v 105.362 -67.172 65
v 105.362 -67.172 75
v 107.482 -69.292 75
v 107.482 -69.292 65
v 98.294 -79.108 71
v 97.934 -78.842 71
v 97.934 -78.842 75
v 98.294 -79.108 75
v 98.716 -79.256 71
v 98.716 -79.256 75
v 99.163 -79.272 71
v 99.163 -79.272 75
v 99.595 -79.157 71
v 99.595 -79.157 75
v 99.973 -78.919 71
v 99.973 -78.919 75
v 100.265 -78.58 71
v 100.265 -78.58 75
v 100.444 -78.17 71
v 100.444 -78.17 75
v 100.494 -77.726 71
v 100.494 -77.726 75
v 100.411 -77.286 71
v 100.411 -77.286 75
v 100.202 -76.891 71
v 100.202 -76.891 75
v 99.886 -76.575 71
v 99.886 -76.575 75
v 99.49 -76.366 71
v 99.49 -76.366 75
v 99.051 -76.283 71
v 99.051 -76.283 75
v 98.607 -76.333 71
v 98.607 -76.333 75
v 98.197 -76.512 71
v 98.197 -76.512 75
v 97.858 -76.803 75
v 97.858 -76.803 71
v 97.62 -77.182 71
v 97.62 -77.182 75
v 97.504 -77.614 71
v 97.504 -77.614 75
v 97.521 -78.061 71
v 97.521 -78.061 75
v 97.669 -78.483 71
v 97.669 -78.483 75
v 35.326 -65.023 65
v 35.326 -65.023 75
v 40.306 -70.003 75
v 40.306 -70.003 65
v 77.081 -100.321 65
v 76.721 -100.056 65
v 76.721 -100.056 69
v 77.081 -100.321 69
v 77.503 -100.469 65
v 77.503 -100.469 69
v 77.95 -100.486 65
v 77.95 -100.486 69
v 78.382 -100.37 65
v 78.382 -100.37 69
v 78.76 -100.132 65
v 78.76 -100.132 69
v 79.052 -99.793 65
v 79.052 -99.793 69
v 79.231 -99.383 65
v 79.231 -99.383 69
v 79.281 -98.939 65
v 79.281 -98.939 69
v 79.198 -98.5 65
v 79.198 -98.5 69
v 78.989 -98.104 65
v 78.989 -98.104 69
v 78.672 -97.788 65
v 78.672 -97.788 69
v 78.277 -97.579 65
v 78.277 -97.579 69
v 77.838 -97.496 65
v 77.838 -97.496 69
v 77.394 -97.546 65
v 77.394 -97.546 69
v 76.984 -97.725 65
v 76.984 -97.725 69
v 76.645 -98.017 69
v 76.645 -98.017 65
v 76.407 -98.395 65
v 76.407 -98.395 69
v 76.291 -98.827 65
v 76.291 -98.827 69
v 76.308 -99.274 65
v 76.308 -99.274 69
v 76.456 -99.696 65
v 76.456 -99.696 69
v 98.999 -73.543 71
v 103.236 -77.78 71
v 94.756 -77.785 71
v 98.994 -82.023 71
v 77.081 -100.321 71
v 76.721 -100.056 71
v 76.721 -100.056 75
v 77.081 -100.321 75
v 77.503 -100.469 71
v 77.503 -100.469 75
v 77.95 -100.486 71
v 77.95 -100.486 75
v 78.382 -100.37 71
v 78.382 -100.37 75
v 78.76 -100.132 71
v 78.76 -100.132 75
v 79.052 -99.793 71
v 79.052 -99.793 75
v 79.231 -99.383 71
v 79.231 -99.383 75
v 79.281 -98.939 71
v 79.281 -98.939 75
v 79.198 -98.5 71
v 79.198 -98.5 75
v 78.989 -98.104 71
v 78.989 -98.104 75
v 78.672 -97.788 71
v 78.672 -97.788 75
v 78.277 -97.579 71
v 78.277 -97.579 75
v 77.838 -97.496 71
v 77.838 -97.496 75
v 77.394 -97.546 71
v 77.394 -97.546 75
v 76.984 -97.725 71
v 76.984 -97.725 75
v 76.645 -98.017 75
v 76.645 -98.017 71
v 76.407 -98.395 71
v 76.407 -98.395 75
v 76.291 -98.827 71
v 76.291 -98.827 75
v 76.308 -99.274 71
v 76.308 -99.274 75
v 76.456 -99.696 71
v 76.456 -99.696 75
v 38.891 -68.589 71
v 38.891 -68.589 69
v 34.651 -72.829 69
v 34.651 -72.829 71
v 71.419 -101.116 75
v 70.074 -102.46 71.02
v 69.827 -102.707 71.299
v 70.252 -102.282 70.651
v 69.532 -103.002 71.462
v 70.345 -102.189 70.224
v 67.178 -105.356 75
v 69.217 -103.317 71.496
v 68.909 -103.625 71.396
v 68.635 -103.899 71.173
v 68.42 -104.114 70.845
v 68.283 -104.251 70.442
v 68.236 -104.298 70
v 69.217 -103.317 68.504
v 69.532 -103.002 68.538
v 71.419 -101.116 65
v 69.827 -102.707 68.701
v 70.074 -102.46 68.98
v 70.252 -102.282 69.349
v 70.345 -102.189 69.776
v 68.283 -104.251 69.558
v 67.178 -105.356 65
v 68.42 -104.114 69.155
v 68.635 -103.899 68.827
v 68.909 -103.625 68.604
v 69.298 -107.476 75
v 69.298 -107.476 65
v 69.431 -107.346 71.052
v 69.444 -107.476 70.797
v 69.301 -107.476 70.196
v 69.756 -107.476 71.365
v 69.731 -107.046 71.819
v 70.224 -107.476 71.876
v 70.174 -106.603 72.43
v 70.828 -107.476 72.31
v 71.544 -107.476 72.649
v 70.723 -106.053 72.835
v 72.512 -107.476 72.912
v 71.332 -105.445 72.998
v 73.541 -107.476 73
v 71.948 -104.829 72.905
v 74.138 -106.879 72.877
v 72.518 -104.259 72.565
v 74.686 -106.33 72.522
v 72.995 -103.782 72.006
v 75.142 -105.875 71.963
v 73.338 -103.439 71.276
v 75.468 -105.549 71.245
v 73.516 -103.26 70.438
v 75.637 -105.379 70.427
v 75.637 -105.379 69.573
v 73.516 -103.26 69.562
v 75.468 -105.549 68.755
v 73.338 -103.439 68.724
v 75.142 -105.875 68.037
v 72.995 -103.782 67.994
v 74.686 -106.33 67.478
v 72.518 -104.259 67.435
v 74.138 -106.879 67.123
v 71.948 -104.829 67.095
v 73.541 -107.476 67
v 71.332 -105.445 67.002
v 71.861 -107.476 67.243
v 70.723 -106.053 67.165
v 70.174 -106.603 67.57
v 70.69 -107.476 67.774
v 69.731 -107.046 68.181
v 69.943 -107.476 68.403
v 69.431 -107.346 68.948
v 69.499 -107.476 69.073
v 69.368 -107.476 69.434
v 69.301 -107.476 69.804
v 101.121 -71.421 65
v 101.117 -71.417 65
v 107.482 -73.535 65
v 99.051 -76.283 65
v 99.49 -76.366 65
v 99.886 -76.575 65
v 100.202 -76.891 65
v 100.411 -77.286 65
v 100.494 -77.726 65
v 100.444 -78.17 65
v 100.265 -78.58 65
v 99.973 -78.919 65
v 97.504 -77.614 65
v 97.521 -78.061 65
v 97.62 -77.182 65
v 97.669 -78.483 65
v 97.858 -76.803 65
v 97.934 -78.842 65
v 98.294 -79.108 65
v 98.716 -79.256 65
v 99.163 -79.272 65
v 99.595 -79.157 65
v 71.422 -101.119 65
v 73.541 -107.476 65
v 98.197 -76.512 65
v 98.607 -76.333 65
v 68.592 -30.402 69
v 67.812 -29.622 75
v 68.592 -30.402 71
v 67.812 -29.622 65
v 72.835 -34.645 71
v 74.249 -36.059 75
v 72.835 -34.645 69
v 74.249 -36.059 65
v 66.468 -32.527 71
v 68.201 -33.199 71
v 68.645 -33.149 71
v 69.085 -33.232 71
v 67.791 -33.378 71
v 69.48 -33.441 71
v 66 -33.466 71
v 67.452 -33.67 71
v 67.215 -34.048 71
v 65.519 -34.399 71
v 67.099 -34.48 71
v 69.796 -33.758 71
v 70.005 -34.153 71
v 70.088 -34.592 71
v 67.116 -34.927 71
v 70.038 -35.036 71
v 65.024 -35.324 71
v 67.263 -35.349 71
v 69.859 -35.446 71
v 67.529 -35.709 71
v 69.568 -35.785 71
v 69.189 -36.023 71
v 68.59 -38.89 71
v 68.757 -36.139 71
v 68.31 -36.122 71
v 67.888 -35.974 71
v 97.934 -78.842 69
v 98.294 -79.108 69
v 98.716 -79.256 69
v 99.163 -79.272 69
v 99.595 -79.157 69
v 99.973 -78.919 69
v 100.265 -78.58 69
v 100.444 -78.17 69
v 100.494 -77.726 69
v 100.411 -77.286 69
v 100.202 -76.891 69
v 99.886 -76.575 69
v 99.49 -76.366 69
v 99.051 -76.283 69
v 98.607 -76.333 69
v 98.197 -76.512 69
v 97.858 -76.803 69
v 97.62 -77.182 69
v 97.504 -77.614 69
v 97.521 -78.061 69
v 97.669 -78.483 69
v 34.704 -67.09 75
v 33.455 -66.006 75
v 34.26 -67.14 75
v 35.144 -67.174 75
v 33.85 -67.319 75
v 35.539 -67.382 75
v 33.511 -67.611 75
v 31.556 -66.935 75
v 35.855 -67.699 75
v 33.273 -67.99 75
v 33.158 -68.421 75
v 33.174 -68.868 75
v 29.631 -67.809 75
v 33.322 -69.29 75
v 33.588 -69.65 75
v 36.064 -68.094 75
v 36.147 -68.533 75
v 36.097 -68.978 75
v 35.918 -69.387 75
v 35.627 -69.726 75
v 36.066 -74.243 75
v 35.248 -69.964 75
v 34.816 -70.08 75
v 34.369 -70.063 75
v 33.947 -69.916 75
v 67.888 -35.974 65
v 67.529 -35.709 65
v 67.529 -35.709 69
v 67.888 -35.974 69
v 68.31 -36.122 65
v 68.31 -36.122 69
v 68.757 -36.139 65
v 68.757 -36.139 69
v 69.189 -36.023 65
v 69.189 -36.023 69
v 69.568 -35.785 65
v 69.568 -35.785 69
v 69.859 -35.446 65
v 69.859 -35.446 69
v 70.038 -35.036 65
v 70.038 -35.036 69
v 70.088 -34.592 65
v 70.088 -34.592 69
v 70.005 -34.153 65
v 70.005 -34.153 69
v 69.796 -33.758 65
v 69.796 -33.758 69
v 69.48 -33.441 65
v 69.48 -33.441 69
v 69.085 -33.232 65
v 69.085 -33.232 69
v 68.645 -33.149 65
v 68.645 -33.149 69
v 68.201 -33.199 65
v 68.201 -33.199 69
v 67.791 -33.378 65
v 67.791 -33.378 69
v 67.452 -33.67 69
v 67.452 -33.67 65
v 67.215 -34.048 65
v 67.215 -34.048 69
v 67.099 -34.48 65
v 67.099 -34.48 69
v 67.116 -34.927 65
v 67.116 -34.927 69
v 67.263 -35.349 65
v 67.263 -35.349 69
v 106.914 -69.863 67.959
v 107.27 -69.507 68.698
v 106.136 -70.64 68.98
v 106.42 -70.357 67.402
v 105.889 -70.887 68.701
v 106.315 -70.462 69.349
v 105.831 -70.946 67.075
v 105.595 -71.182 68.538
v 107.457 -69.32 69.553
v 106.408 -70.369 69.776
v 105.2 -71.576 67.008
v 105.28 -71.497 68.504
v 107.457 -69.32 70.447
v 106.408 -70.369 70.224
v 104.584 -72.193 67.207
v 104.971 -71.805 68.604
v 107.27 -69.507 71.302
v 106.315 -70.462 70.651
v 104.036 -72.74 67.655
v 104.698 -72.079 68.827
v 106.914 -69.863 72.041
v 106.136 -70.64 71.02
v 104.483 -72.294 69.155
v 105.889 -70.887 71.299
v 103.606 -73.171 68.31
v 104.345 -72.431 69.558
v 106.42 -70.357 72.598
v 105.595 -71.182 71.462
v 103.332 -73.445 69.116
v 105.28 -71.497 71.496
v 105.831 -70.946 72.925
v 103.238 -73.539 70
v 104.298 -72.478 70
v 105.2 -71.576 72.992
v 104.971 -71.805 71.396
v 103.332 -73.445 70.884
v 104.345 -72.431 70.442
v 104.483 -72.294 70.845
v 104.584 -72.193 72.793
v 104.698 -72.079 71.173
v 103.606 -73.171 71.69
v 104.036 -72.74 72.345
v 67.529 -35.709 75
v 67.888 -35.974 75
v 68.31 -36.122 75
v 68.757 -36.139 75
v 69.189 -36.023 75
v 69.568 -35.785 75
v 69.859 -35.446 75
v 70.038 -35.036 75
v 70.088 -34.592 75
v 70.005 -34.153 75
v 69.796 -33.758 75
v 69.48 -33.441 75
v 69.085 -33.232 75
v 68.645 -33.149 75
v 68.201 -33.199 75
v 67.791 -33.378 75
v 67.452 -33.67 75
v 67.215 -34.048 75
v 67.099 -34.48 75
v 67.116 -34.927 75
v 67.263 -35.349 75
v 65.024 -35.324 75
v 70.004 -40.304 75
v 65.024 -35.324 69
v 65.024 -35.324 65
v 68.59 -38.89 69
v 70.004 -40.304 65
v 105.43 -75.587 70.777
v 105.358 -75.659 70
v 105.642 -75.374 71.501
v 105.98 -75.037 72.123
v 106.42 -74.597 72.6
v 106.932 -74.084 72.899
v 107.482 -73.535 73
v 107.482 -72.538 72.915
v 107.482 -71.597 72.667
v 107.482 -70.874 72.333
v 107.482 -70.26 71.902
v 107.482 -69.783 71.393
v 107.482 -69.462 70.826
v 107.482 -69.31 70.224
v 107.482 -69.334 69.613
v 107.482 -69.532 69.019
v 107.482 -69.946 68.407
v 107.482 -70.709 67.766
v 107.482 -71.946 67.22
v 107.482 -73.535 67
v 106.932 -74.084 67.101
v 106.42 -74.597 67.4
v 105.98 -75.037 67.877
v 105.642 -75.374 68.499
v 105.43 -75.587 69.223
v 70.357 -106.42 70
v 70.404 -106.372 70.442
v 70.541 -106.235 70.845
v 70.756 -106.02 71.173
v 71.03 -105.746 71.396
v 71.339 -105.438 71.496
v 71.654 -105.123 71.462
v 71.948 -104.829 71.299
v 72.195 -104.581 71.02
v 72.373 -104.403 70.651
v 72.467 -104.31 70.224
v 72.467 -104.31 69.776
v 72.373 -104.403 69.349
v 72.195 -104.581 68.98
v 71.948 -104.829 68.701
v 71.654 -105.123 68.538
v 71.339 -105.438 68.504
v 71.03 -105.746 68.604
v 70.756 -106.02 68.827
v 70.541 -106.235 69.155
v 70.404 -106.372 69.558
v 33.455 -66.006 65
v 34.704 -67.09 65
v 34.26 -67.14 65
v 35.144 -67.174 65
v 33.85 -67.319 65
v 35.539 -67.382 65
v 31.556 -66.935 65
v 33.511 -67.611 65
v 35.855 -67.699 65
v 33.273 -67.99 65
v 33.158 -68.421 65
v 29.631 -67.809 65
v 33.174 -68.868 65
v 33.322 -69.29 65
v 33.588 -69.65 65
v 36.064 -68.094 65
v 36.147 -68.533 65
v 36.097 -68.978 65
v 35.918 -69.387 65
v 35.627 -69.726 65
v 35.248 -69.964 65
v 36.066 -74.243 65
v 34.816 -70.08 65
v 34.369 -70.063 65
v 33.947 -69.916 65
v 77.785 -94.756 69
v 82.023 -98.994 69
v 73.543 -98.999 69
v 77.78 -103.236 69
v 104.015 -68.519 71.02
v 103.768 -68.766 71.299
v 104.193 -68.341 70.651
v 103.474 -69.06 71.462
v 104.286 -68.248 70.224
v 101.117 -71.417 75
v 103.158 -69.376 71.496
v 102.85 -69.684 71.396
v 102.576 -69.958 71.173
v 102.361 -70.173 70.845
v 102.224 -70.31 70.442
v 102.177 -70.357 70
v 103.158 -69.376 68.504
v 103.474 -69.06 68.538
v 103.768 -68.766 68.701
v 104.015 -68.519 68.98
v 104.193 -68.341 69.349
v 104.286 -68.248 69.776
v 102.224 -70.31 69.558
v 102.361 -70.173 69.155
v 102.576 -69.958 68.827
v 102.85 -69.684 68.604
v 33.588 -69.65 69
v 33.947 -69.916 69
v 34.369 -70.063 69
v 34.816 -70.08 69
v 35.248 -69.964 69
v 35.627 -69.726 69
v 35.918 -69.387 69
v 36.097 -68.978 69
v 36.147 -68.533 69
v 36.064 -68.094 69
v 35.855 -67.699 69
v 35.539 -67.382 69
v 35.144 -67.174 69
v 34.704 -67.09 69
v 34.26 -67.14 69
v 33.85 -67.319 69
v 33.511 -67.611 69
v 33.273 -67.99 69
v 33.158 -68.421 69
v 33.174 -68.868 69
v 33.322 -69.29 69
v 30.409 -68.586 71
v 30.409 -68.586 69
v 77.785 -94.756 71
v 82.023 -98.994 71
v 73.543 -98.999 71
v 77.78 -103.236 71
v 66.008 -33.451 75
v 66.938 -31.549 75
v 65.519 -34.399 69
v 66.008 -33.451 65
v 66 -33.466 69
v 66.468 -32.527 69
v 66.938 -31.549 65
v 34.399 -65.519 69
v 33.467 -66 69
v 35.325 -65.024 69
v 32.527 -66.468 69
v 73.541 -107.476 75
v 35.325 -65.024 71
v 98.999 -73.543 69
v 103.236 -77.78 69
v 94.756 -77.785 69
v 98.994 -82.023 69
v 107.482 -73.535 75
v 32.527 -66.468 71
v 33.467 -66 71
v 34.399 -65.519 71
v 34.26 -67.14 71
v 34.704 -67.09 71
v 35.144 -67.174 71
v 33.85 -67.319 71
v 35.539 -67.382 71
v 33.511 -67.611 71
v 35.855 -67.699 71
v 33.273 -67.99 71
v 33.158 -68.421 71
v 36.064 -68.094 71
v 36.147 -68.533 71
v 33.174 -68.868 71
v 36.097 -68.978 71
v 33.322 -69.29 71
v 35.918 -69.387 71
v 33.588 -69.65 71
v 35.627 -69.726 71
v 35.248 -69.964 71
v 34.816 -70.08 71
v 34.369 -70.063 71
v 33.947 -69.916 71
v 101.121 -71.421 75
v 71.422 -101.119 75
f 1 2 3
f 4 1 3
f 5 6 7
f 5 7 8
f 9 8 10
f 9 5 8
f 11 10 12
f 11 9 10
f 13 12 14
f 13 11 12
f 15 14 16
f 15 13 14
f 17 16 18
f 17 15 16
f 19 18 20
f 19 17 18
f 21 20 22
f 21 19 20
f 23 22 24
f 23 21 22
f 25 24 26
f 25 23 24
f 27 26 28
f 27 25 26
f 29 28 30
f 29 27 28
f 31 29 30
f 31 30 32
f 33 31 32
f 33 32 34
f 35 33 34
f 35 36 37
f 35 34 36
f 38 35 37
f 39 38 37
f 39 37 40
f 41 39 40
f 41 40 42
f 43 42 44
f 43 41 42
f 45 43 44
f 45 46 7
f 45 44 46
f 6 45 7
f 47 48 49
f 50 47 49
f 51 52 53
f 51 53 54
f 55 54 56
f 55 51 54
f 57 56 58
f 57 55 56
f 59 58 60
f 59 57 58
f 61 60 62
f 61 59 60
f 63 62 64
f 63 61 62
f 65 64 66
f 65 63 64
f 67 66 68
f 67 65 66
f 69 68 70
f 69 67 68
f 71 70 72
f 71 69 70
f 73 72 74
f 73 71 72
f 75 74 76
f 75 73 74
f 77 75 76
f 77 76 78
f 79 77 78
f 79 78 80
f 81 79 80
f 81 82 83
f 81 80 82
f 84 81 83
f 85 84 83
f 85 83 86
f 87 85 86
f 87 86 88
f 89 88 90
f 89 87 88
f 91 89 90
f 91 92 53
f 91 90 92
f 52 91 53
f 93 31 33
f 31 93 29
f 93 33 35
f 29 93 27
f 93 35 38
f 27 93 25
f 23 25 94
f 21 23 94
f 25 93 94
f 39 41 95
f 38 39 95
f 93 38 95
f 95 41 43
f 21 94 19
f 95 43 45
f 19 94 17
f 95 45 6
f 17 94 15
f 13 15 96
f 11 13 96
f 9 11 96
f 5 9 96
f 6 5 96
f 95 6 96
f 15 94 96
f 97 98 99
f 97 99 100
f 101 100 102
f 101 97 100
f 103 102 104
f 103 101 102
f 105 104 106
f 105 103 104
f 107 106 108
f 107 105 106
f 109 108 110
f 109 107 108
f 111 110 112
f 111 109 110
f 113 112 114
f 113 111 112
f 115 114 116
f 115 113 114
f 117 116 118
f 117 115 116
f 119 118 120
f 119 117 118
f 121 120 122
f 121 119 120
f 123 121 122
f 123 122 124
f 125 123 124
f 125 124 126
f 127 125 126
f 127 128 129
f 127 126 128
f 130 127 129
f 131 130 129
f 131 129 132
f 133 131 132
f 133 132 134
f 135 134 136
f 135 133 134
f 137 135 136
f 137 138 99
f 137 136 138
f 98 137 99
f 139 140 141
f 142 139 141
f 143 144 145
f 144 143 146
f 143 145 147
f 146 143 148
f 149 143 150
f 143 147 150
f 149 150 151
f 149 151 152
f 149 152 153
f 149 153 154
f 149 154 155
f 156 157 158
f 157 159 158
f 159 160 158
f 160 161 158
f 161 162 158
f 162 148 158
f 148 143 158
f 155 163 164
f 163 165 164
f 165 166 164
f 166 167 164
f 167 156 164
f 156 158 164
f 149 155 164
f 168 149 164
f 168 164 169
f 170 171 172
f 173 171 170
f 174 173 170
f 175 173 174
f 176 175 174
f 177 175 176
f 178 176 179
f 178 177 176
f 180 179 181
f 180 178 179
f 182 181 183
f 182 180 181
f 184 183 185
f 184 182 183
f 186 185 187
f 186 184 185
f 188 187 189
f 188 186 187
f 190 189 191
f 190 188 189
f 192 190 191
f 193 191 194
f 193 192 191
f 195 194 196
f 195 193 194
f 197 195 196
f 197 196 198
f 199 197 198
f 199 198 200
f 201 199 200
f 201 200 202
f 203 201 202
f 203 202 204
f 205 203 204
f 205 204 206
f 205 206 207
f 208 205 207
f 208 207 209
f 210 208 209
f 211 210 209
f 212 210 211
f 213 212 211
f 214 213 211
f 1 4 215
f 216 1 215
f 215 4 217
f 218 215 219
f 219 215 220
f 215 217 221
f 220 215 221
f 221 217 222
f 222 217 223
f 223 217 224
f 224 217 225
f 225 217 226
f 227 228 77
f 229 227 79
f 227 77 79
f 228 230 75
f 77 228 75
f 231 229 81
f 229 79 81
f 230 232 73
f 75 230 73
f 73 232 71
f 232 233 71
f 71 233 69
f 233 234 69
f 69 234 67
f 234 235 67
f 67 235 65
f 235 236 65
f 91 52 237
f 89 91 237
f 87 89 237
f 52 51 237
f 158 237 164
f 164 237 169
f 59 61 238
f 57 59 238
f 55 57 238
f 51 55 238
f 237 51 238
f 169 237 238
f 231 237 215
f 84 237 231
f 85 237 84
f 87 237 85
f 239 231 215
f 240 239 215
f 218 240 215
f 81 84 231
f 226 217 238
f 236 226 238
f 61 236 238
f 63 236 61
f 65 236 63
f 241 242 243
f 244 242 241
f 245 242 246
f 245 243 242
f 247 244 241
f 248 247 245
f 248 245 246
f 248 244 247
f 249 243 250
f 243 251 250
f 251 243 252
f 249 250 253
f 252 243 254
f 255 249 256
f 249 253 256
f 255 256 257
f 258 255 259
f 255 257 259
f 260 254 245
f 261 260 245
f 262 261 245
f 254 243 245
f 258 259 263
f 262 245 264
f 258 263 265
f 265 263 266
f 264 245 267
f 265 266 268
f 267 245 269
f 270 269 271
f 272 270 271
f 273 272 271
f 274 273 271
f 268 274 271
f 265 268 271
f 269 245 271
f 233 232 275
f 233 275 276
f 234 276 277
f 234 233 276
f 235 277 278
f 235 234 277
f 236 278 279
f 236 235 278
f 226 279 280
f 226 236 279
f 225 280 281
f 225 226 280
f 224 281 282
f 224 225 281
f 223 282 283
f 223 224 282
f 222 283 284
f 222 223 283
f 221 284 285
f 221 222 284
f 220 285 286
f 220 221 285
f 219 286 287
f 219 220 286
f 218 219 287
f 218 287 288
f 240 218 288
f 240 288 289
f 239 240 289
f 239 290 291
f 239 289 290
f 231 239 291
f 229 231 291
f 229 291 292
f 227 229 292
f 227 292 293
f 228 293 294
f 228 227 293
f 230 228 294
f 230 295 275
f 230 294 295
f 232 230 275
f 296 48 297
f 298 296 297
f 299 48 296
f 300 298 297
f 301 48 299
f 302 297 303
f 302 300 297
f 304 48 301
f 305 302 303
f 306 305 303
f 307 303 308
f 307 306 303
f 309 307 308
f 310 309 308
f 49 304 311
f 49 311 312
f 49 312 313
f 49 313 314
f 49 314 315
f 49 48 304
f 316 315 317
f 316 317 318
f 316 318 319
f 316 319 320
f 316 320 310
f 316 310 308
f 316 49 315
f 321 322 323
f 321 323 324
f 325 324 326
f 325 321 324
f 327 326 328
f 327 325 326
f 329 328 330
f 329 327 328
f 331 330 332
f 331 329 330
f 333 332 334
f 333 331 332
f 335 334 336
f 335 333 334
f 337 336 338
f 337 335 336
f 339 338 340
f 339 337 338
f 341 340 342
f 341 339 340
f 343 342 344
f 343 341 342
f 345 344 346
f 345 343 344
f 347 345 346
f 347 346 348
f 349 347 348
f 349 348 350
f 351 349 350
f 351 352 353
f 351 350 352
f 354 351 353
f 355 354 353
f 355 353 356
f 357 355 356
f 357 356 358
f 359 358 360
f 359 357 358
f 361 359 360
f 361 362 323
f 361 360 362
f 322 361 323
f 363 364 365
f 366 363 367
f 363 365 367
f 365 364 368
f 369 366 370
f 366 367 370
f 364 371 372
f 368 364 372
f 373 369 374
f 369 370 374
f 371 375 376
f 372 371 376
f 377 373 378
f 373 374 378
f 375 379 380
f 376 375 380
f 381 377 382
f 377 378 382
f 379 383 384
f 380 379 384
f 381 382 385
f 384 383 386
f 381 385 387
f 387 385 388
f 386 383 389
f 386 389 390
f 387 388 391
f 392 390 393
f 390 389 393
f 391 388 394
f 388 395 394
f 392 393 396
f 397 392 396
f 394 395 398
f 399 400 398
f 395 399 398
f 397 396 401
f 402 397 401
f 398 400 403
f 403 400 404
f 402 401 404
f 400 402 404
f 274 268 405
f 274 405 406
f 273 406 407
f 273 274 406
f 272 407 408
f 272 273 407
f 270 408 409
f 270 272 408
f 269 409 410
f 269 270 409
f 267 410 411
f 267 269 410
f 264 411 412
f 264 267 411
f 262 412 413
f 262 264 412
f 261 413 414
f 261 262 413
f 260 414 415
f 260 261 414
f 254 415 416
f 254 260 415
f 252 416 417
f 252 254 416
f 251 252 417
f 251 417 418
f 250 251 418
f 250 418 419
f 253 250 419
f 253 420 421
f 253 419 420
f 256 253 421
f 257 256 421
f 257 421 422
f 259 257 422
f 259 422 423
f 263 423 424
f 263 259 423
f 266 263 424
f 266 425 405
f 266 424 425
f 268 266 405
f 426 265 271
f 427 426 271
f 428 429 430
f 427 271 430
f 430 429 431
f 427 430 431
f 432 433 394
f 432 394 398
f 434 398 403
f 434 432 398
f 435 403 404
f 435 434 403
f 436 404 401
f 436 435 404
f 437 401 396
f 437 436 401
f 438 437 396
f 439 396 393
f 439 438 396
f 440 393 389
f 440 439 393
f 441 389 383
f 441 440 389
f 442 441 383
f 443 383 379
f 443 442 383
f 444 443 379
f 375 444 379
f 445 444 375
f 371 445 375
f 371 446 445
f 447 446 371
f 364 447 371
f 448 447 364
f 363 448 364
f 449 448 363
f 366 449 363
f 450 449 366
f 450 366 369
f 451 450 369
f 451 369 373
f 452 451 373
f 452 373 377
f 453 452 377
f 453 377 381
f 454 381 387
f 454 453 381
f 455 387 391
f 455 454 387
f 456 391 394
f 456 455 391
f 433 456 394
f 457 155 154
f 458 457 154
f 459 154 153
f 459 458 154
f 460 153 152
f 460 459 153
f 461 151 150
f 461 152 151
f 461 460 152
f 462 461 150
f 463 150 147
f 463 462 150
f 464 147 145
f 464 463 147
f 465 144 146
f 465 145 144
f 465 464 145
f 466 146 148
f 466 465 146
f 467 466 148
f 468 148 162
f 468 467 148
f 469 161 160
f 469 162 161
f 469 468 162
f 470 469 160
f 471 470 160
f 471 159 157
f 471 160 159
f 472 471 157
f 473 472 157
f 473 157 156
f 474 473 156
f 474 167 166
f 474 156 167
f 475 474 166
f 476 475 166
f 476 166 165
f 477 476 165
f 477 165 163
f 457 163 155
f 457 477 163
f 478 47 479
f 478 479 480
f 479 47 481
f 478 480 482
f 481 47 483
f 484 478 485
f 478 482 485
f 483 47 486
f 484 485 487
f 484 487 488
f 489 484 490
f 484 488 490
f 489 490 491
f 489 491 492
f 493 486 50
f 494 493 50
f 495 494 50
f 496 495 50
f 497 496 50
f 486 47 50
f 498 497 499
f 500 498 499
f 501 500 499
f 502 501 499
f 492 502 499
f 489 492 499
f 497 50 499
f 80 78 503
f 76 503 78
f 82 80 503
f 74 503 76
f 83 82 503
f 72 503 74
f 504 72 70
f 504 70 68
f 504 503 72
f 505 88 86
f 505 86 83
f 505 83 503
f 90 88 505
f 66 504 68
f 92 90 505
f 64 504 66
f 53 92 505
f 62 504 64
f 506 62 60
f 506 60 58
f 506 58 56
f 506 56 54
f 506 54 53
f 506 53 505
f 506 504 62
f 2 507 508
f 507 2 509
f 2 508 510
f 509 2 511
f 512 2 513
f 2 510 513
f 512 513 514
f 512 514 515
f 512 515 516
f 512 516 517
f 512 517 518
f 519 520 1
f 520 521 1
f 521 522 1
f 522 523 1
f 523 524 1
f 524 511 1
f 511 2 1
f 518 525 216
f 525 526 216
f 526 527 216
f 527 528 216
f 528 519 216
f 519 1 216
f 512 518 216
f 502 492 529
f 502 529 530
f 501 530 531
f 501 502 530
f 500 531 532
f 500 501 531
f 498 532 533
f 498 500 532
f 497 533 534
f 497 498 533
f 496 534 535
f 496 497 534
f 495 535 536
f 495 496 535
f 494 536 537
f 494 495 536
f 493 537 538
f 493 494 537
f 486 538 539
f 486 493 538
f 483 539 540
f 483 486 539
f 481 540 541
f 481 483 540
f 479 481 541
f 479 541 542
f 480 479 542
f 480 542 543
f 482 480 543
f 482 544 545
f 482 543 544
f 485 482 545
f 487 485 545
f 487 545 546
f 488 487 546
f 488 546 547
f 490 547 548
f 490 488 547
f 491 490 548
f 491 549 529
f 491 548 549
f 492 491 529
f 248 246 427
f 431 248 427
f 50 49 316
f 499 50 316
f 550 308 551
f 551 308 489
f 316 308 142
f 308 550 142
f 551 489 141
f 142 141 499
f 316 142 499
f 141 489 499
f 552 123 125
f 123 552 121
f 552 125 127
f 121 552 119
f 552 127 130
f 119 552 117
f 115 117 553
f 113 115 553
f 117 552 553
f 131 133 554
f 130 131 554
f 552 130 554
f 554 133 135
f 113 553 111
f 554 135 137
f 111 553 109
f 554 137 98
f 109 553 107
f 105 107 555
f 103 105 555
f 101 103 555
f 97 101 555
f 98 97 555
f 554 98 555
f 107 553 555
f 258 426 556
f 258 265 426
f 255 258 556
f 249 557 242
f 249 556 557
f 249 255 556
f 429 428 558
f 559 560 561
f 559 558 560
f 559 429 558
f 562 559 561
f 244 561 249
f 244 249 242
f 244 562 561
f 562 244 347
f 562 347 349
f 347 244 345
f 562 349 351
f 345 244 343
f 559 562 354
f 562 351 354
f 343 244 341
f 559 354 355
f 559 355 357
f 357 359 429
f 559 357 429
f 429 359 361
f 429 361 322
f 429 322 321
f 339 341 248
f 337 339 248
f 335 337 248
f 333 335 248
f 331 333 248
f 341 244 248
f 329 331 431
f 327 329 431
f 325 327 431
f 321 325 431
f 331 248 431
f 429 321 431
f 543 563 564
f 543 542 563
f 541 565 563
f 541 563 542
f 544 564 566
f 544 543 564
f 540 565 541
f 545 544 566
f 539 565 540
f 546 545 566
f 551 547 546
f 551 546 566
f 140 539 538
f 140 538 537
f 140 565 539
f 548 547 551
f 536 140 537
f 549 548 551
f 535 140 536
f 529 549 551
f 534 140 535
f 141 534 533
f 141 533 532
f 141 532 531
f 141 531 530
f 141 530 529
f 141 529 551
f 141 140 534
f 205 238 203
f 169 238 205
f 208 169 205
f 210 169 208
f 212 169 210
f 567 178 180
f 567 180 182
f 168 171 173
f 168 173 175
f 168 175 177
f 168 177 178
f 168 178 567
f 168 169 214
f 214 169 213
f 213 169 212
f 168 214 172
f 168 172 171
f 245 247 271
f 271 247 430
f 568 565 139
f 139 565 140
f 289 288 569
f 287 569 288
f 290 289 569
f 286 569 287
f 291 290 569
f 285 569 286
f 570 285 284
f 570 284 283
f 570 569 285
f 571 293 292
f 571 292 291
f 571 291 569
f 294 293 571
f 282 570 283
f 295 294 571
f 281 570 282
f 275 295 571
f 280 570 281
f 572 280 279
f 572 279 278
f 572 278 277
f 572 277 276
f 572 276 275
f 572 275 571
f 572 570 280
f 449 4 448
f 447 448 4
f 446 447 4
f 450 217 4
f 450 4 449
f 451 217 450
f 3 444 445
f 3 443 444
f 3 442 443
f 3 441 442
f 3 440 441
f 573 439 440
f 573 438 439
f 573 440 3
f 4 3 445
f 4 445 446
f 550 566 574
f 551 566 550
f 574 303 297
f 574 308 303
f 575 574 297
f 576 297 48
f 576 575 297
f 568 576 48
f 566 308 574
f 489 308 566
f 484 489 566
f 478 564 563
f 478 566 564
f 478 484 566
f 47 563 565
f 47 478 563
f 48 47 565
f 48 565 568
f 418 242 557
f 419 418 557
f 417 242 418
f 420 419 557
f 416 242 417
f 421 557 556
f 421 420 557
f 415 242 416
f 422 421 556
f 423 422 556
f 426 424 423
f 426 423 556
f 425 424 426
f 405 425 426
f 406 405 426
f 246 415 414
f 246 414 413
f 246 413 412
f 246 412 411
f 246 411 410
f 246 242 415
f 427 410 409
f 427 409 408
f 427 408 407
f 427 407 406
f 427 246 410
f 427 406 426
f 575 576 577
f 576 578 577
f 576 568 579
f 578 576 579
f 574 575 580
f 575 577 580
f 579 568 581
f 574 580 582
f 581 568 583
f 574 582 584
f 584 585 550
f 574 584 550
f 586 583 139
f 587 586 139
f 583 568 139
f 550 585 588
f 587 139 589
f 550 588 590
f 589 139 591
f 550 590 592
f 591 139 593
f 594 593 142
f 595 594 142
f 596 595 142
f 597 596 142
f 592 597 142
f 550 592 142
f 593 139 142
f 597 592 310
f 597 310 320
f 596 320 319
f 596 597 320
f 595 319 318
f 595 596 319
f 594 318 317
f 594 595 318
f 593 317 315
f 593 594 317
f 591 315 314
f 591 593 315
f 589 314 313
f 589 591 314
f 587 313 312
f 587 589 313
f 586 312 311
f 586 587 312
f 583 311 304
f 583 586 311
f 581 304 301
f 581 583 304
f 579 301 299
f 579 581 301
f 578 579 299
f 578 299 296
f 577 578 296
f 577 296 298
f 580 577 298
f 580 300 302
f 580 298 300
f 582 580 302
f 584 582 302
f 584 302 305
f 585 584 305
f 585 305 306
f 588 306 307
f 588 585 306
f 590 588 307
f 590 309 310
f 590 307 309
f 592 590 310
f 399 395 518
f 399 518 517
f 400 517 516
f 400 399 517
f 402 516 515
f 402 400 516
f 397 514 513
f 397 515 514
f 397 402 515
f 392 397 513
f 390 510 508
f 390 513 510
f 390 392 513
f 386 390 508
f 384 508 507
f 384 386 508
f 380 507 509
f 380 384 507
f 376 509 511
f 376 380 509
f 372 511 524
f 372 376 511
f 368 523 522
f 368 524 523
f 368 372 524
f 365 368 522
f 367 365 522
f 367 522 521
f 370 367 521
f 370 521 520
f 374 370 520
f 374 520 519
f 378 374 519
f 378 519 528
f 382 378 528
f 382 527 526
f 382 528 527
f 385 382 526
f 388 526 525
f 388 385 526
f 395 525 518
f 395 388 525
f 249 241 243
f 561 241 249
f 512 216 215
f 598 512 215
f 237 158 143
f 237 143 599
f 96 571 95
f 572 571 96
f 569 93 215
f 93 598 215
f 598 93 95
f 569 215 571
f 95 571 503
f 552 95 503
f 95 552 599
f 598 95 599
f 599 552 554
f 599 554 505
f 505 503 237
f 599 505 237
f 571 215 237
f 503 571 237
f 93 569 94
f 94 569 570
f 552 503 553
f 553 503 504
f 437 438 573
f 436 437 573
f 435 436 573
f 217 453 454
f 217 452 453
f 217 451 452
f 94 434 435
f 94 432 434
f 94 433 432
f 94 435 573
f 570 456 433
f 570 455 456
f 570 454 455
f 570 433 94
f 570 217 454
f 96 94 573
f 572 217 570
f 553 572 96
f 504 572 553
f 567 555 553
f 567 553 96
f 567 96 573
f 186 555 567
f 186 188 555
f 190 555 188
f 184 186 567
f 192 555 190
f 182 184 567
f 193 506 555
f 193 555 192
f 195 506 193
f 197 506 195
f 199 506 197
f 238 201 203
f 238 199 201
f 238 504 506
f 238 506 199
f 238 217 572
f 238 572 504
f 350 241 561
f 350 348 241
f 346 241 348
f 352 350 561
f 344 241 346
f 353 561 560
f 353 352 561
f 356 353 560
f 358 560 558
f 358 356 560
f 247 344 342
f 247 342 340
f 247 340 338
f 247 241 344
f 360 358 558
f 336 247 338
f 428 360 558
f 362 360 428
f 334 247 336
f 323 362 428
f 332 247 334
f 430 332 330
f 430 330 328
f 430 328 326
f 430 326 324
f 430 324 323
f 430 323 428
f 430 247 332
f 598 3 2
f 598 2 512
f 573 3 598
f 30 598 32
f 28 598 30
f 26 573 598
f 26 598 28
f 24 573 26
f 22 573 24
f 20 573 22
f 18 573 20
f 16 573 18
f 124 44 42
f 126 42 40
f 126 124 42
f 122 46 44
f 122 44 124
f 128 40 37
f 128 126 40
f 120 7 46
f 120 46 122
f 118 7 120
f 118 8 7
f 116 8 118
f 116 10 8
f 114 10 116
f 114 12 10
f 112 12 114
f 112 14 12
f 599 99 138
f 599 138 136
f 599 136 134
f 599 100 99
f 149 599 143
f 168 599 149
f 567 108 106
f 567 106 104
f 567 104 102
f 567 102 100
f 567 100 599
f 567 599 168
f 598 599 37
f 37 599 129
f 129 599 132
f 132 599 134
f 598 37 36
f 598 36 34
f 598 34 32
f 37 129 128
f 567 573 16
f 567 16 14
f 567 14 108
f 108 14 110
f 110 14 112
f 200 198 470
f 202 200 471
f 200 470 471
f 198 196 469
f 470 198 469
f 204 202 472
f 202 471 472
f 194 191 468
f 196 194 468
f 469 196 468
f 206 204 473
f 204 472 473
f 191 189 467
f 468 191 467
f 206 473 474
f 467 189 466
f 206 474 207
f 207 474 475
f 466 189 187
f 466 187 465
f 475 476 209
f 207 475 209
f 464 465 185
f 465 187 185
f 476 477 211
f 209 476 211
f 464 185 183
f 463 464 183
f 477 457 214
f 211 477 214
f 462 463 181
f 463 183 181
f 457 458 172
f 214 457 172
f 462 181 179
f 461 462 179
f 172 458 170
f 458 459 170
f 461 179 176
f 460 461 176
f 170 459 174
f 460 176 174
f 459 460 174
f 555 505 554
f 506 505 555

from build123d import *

# Parameters (mm, degrees)
CYLINDER1721_R              = 1.5
CYLINDER1721_DEPTH          = 60
CYLINDER1718_R              = 1.5
CYLINDER1718_DEPTH          = 60
CYLINDER1719_R              = 1.5
CYLINDER1719_DEPTH          = 60
CYLINDER1720_R              = 1.5
CYLINDER1720_DEPTH          = 60
COMPOUND860_PLACEMENT_ANGLE = 225
BOX682_W                    = 6
BOX682_H                    = 6
BOX682_DEPTH                = 2
BOX680_W                    = 6
BOX680_H                    = 6
BOX680_DEPTH                = 2
BOX683_W                    = 6
BOX683_H                    = 6
BOX683_DEPTH                = 2
BOX681_W                    = 7
BOX681_H                    = 6
BOX681_DEPTH                = 2
COMPOUND859_PLACEMENT_ANGLE = 225
CYLINDER1711_R              = 1.5
CYLINDER1711_DEPTH          = 50
COMPOUND852_PLACEMENT_ANGLE = 225
CYLINDER1710_R              = 1.5
CYLINDER1710_DEPTH          = 50
COMPOUND851_PLACEMENT_ANGLE = 225
CYLINDER1713_R              = 3
CYLINDER1713_DEPTH          = 3
COMPOUND855_PLACEMENT_ANGLE = 225
CYLINDER1712_R              = 3
CYLINDER1712_DEPTH          = 3
COMPOUND854_PLACEMENT_ANGLE = 225
CYLINDER1709_R              = 74
CYLINDER1709_DEPTH          = 40
BOX675_W                    = 42
BOX675_H                    = 62
BOX675_DEPTH                = 50
COMPOUND850_PLACEMENT_ANGLE = 225
BOX674_W                    = 56
BOX674_H                    = 44
BOX674_DEPTH                = 10
COMPOUND849_PLACEMENT_ANGLE = 225
BOX673_W                    = 54
BOX673_H                    = 68
BOX673_DEPTH                = 10
COMPOUND848_PLACEMENT_ANGLE = 225
CHAMFER052_SIZE             = 3


with BuildPart() as v_lec1721:
    # Cylinder1721 → Cylinder1721 (new body)
    with BuildSketch(Plane(origin=(-24, 73, -80), x_dir=(1, 0, 0), z_dir=(0, 0, 1))):
        Circle(CYLINDER1721_R)
    extrude(amount=CYLINDER1721_DEPTH)


with BuildPart() as v_lec1718:
    # Cylinder1718 → Cylinder1718 (new body)
    with BuildSketch(Plane(origin=(-15, 125, -80), x_dir=(1, 0, 0), z_dir=(0, 0, 1))):
        Circle(CYLINDER1718_R)
    extrude(amount=CYLINDER1718_DEPTH)


with BuildPart() as v_lec1719:
    # Cylinder1719 → Cylinder1719 (new body)
    with BuildSketch(Plane(origin=(15, 125, -80), x_dir=(1, 0, 0), z_dir=(0, 0, 1))):
        Circle(CYLINDER1719_R)
    extrude(amount=CYLINDER1719_DEPTH)


with BuildPart() as compound860:
    # Cylinder1720 → Cylinder1720 (new body)
    with BuildSketch(Plane(origin=(24, 73, -80), x_dir=(1, 0, 0), z_dir=(0, 0, 1))):
        Circle(CYLINDER1720_R)
    extrude(amount=CYLINDER1720_DEPTH)

    # Compound860: union Válec1721, Válec1718, Válec1719
    add(v_lec1721.part)
    add(v_lec1718.part)
    add(v_lec1719.part)


with BuildPart() as compound860_1:
    # Compound860 placement: moved
    add(compound860.part.moved(Location((0, 0, 100))).rotate(Axis((0, 0, 100), (0, 0, 1)), COMPOUND860_PLACEMENT_ANGLE))


with BuildPart() as krychle682:
    # Box682 → Box682 (new body)
    with BuildSketch(Plane(origin=(-18, 122, -48), x_dir=(1, 0, 0), z_dir=(0, 0, 1))):
        with Locations((3, 3)):
            Rectangle(BOX682_W, BOX682_H)
    extrude(amount=BOX682_DEPTH)


with BuildPart() as krychle680:
    # Box680 → Box680 (new body)
    with BuildSketch(Plane(origin=(21, 70, -48), x_dir=(1, 0, 0), z_dir=(0, 0, 1))):
        with Locations((3, 3)):
            Rectangle(BOX680_W, BOX680_H)
    extrude(amount=BOX680_DEPTH)


with BuildPart() as krychle683:
    # Box683 → Box683 (new body)
    with BuildSketch(Plane(origin=(12, 122, -48), x_dir=(1, 0, 0), z_dir=(0, 0, 1))):
        with Locations((3, 3)):
            Rectangle(BOX683_W, BOX683_H)
    extrude(amount=BOX683_DEPTH)


with BuildPart() as compound859:
    # Box681 → Box681 (new body)
    with BuildSketch(Plane(origin=(-28, 70, -48), x_dir=(1, 0, 0), z_dir=(0, 0, 1))):
        with Locations((3.5, 3)):
            Rectangle(BOX681_W, BOX681_H)
    extrude(amount=BOX681_DEPTH)

    # Compound859: union Krychle682, Krychle680, Krychle683
    add(krychle682.part)
    add(krychle680.part)
    add(krychle683.part)


with BuildPart() as compound859_1:
    # Compound859 placement: moved
    add(compound859.part.moved(Location((0, 0, 117))).rotate(Axis((0, 0, 117), (0, 0, 1)), COMPOUND859_PLACEMENT_ANGLE))


with BuildPart() as compound852:
    # Cylinder1711 → Cylinder1711 (new body)
    with BuildSketch(Plane(origin=(24, 140, 72), x_dir=(1, 0, 0), z_dir=(0, -1, 0))):
        Circle(CYLINDER1711_R)
    extrude(amount=CYLINDER1711_DEPTH)


with BuildPart() as compound852_1:
    # Compound852 placement: moved
    add(compound852.part.rotate(Axis((0, 0, 0), (0, 0, 1)), COMPOUND852_PLACEMENT_ANGLE))


with BuildPart() as compound853:
    # Cylinder1710 → Cylinder1710 (new body)
    with BuildSketch(Plane(origin=(-24, 140, 72), x_dir=(1, 0, 0), z_dir=(0, -1, 0))):
        Circle(CYLINDER1710_R)
    extrude(amount=CYLINDER1710_DEPTH)


with BuildPart() as compound853_1:
    # Compound851 placement: moved
    add(compound853.part.rotate(Axis((0, 0, 0), (0, 0, 1)), COMPOUND851_PLACEMENT_ANGLE))

    # Compound853: union Compound852
    add(compound852_1.part)


with BuildPart() as compound853_2:
    # Compound853 placement: moved
    add(compound853_1.part.moved(Location((0, 0, -2))))


with BuildPart() as compound855:
    # Cylinder1713 → Cylinder1713 (new body)
    with BuildSketch(Plane(origin=(24, 128, 72), x_dir=(1, 0, 0), z_dir=(0, -1, 0))):
        Circle(CYLINDER1713_R)
    extrude(amount=CYLINDER1713_DEPTH)


with BuildPart() as compound855_1:
    # Compound855 placement: moved
    add(compound855.part.rotate(Axis((0, 0, 0), (0, 0, 1)), COMPOUND855_PLACEMENT_ANGLE))


with BuildPart() as compound856:
    # Cylinder1712 → Cylinder1712 (new body)
    with BuildSketch(Plane(origin=(-24, 128, 72), x_dir=(1, 0, 0), z_dir=(0, -1, 0))):
        Circle(CYLINDER1712_R)
    extrude(amount=CYLINDER1712_DEPTH)


with BuildPart() as compound856_1:
    # Compound854 placement: moved
    add(compound856.part.rotate(Axis((0, 0, 0), (0, 0, 1)), COMPOUND854_PLACEMENT_ANGLE))

    # Compound856: union Compound855
    add(compound855_1.part)


with BuildPart() as compound856_2:
    # Compound856 placement: moved
    add(compound856_1.part.moved(Location((0, 0, -2))))


with BuildPart() as v_lec1709:
    # Cylinder1709 → Cylinder1709 (new body)
    with BuildSketch(Plane.XY.offset(44)):
        Circle(CYLINDER1709_R)
    extrude(amount=CYLINDER1709_DEPTH)


with BuildPart() as compound850:
    # Box675 → Box675 (new body)
    with BuildSketch(Plane(origin=(-21.001071, 60.005081, 31), x_dir=(1, 0, 0), z_dir=(0, 0, 1))):
        with Locations((21, 31)):
            Rectangle(BOX675_W, BOX675_H)
    extrude(amount=BOX675_DEPTH)


with BuildPart() as compound850_1:
    # Compound850 placement: moved
    add(compound850.part.rotate(Axis((0, 0, 0), (0, 0, 1)), COMPOUND850_PLACEMENT_ANGLE))


with BuildPart() as compound849:
    # Box674 → Box674 (new body)
    with BuildSketch(Plane(origin=(-28, 78, 75), x_dir=(1, 0, 0), z_dir=(0, 0, 1))):
        with Locations((28, 22)):
            Rectangle(BOX674_W, BOX674_H)
    extrude(amount=BOX674_DEPTH)


with BuildPart() as compound849_1:
    # Compound849 placement: moved
    add(compound849.part.moved(Location((0, 0, -10))).rotate(Axis((0, 0, -10), (0, 0, 1)), COMPOUND849_PLACEMENT_ANGLE))


with BuildPart() as cut497:
    # Box673 → Box673 (new body)
    with BuildSketch(Plane(origin=(-27.004408, 59.99801, 75), x_dir=(1, 0, 0), z_dir=(0, 0, 1))):
        with Locations((27, 34)):
            Rectangle(BOX673_W, BOX673_H)
    extrude(amount=BOX673_DEPTH)


with BuildPart() as cut497_1:
    # Compound848 placement: moved
    add(cut497.part.moved(Location((0, 0, -10))).rotate(Axis((0, 0, -10), (0, 0, 1)), COMPOUND848_PLACEMENT_ANGLE))

    # Cut491: cut Compound849
    add(compound849_1.part, mode=Mode.SUBTRACT)

    # Cut492: cut Compound850
    add(compound850_1.part, mode=Mode.SUBTRACT)

    # Cut493: cut Válec1709
    add(v_lec1709.part, mode=Mode.SUBTRACT)

    # Chamfer052
    chamfer052_edges = [cut497_1.edges().sort_by_distance(p)[0] for p in [
        (109.603261, -71.413261, 70),
        (71.419495, -109.597027, 70),
    ]]
    chamfer(chamfer052_edges, length=CHAMFER052_SIZE)

    # Cut494: cut Compound856
    add(compound856_2.part, mode=Mode.SUBTRACT)

    # Cut495: cut Compound853
    add(compound853_2.part, mode=Mode.SUBTRACT)

    # Cut496: cut Compound859
    add(compound859_1.part, mode=Mode.SUBTRACT)

    # Cut497: cut Compound860
    add(compound860_1.part, mode=Mode.SUBTRACT)


solid = cut497_1.part
